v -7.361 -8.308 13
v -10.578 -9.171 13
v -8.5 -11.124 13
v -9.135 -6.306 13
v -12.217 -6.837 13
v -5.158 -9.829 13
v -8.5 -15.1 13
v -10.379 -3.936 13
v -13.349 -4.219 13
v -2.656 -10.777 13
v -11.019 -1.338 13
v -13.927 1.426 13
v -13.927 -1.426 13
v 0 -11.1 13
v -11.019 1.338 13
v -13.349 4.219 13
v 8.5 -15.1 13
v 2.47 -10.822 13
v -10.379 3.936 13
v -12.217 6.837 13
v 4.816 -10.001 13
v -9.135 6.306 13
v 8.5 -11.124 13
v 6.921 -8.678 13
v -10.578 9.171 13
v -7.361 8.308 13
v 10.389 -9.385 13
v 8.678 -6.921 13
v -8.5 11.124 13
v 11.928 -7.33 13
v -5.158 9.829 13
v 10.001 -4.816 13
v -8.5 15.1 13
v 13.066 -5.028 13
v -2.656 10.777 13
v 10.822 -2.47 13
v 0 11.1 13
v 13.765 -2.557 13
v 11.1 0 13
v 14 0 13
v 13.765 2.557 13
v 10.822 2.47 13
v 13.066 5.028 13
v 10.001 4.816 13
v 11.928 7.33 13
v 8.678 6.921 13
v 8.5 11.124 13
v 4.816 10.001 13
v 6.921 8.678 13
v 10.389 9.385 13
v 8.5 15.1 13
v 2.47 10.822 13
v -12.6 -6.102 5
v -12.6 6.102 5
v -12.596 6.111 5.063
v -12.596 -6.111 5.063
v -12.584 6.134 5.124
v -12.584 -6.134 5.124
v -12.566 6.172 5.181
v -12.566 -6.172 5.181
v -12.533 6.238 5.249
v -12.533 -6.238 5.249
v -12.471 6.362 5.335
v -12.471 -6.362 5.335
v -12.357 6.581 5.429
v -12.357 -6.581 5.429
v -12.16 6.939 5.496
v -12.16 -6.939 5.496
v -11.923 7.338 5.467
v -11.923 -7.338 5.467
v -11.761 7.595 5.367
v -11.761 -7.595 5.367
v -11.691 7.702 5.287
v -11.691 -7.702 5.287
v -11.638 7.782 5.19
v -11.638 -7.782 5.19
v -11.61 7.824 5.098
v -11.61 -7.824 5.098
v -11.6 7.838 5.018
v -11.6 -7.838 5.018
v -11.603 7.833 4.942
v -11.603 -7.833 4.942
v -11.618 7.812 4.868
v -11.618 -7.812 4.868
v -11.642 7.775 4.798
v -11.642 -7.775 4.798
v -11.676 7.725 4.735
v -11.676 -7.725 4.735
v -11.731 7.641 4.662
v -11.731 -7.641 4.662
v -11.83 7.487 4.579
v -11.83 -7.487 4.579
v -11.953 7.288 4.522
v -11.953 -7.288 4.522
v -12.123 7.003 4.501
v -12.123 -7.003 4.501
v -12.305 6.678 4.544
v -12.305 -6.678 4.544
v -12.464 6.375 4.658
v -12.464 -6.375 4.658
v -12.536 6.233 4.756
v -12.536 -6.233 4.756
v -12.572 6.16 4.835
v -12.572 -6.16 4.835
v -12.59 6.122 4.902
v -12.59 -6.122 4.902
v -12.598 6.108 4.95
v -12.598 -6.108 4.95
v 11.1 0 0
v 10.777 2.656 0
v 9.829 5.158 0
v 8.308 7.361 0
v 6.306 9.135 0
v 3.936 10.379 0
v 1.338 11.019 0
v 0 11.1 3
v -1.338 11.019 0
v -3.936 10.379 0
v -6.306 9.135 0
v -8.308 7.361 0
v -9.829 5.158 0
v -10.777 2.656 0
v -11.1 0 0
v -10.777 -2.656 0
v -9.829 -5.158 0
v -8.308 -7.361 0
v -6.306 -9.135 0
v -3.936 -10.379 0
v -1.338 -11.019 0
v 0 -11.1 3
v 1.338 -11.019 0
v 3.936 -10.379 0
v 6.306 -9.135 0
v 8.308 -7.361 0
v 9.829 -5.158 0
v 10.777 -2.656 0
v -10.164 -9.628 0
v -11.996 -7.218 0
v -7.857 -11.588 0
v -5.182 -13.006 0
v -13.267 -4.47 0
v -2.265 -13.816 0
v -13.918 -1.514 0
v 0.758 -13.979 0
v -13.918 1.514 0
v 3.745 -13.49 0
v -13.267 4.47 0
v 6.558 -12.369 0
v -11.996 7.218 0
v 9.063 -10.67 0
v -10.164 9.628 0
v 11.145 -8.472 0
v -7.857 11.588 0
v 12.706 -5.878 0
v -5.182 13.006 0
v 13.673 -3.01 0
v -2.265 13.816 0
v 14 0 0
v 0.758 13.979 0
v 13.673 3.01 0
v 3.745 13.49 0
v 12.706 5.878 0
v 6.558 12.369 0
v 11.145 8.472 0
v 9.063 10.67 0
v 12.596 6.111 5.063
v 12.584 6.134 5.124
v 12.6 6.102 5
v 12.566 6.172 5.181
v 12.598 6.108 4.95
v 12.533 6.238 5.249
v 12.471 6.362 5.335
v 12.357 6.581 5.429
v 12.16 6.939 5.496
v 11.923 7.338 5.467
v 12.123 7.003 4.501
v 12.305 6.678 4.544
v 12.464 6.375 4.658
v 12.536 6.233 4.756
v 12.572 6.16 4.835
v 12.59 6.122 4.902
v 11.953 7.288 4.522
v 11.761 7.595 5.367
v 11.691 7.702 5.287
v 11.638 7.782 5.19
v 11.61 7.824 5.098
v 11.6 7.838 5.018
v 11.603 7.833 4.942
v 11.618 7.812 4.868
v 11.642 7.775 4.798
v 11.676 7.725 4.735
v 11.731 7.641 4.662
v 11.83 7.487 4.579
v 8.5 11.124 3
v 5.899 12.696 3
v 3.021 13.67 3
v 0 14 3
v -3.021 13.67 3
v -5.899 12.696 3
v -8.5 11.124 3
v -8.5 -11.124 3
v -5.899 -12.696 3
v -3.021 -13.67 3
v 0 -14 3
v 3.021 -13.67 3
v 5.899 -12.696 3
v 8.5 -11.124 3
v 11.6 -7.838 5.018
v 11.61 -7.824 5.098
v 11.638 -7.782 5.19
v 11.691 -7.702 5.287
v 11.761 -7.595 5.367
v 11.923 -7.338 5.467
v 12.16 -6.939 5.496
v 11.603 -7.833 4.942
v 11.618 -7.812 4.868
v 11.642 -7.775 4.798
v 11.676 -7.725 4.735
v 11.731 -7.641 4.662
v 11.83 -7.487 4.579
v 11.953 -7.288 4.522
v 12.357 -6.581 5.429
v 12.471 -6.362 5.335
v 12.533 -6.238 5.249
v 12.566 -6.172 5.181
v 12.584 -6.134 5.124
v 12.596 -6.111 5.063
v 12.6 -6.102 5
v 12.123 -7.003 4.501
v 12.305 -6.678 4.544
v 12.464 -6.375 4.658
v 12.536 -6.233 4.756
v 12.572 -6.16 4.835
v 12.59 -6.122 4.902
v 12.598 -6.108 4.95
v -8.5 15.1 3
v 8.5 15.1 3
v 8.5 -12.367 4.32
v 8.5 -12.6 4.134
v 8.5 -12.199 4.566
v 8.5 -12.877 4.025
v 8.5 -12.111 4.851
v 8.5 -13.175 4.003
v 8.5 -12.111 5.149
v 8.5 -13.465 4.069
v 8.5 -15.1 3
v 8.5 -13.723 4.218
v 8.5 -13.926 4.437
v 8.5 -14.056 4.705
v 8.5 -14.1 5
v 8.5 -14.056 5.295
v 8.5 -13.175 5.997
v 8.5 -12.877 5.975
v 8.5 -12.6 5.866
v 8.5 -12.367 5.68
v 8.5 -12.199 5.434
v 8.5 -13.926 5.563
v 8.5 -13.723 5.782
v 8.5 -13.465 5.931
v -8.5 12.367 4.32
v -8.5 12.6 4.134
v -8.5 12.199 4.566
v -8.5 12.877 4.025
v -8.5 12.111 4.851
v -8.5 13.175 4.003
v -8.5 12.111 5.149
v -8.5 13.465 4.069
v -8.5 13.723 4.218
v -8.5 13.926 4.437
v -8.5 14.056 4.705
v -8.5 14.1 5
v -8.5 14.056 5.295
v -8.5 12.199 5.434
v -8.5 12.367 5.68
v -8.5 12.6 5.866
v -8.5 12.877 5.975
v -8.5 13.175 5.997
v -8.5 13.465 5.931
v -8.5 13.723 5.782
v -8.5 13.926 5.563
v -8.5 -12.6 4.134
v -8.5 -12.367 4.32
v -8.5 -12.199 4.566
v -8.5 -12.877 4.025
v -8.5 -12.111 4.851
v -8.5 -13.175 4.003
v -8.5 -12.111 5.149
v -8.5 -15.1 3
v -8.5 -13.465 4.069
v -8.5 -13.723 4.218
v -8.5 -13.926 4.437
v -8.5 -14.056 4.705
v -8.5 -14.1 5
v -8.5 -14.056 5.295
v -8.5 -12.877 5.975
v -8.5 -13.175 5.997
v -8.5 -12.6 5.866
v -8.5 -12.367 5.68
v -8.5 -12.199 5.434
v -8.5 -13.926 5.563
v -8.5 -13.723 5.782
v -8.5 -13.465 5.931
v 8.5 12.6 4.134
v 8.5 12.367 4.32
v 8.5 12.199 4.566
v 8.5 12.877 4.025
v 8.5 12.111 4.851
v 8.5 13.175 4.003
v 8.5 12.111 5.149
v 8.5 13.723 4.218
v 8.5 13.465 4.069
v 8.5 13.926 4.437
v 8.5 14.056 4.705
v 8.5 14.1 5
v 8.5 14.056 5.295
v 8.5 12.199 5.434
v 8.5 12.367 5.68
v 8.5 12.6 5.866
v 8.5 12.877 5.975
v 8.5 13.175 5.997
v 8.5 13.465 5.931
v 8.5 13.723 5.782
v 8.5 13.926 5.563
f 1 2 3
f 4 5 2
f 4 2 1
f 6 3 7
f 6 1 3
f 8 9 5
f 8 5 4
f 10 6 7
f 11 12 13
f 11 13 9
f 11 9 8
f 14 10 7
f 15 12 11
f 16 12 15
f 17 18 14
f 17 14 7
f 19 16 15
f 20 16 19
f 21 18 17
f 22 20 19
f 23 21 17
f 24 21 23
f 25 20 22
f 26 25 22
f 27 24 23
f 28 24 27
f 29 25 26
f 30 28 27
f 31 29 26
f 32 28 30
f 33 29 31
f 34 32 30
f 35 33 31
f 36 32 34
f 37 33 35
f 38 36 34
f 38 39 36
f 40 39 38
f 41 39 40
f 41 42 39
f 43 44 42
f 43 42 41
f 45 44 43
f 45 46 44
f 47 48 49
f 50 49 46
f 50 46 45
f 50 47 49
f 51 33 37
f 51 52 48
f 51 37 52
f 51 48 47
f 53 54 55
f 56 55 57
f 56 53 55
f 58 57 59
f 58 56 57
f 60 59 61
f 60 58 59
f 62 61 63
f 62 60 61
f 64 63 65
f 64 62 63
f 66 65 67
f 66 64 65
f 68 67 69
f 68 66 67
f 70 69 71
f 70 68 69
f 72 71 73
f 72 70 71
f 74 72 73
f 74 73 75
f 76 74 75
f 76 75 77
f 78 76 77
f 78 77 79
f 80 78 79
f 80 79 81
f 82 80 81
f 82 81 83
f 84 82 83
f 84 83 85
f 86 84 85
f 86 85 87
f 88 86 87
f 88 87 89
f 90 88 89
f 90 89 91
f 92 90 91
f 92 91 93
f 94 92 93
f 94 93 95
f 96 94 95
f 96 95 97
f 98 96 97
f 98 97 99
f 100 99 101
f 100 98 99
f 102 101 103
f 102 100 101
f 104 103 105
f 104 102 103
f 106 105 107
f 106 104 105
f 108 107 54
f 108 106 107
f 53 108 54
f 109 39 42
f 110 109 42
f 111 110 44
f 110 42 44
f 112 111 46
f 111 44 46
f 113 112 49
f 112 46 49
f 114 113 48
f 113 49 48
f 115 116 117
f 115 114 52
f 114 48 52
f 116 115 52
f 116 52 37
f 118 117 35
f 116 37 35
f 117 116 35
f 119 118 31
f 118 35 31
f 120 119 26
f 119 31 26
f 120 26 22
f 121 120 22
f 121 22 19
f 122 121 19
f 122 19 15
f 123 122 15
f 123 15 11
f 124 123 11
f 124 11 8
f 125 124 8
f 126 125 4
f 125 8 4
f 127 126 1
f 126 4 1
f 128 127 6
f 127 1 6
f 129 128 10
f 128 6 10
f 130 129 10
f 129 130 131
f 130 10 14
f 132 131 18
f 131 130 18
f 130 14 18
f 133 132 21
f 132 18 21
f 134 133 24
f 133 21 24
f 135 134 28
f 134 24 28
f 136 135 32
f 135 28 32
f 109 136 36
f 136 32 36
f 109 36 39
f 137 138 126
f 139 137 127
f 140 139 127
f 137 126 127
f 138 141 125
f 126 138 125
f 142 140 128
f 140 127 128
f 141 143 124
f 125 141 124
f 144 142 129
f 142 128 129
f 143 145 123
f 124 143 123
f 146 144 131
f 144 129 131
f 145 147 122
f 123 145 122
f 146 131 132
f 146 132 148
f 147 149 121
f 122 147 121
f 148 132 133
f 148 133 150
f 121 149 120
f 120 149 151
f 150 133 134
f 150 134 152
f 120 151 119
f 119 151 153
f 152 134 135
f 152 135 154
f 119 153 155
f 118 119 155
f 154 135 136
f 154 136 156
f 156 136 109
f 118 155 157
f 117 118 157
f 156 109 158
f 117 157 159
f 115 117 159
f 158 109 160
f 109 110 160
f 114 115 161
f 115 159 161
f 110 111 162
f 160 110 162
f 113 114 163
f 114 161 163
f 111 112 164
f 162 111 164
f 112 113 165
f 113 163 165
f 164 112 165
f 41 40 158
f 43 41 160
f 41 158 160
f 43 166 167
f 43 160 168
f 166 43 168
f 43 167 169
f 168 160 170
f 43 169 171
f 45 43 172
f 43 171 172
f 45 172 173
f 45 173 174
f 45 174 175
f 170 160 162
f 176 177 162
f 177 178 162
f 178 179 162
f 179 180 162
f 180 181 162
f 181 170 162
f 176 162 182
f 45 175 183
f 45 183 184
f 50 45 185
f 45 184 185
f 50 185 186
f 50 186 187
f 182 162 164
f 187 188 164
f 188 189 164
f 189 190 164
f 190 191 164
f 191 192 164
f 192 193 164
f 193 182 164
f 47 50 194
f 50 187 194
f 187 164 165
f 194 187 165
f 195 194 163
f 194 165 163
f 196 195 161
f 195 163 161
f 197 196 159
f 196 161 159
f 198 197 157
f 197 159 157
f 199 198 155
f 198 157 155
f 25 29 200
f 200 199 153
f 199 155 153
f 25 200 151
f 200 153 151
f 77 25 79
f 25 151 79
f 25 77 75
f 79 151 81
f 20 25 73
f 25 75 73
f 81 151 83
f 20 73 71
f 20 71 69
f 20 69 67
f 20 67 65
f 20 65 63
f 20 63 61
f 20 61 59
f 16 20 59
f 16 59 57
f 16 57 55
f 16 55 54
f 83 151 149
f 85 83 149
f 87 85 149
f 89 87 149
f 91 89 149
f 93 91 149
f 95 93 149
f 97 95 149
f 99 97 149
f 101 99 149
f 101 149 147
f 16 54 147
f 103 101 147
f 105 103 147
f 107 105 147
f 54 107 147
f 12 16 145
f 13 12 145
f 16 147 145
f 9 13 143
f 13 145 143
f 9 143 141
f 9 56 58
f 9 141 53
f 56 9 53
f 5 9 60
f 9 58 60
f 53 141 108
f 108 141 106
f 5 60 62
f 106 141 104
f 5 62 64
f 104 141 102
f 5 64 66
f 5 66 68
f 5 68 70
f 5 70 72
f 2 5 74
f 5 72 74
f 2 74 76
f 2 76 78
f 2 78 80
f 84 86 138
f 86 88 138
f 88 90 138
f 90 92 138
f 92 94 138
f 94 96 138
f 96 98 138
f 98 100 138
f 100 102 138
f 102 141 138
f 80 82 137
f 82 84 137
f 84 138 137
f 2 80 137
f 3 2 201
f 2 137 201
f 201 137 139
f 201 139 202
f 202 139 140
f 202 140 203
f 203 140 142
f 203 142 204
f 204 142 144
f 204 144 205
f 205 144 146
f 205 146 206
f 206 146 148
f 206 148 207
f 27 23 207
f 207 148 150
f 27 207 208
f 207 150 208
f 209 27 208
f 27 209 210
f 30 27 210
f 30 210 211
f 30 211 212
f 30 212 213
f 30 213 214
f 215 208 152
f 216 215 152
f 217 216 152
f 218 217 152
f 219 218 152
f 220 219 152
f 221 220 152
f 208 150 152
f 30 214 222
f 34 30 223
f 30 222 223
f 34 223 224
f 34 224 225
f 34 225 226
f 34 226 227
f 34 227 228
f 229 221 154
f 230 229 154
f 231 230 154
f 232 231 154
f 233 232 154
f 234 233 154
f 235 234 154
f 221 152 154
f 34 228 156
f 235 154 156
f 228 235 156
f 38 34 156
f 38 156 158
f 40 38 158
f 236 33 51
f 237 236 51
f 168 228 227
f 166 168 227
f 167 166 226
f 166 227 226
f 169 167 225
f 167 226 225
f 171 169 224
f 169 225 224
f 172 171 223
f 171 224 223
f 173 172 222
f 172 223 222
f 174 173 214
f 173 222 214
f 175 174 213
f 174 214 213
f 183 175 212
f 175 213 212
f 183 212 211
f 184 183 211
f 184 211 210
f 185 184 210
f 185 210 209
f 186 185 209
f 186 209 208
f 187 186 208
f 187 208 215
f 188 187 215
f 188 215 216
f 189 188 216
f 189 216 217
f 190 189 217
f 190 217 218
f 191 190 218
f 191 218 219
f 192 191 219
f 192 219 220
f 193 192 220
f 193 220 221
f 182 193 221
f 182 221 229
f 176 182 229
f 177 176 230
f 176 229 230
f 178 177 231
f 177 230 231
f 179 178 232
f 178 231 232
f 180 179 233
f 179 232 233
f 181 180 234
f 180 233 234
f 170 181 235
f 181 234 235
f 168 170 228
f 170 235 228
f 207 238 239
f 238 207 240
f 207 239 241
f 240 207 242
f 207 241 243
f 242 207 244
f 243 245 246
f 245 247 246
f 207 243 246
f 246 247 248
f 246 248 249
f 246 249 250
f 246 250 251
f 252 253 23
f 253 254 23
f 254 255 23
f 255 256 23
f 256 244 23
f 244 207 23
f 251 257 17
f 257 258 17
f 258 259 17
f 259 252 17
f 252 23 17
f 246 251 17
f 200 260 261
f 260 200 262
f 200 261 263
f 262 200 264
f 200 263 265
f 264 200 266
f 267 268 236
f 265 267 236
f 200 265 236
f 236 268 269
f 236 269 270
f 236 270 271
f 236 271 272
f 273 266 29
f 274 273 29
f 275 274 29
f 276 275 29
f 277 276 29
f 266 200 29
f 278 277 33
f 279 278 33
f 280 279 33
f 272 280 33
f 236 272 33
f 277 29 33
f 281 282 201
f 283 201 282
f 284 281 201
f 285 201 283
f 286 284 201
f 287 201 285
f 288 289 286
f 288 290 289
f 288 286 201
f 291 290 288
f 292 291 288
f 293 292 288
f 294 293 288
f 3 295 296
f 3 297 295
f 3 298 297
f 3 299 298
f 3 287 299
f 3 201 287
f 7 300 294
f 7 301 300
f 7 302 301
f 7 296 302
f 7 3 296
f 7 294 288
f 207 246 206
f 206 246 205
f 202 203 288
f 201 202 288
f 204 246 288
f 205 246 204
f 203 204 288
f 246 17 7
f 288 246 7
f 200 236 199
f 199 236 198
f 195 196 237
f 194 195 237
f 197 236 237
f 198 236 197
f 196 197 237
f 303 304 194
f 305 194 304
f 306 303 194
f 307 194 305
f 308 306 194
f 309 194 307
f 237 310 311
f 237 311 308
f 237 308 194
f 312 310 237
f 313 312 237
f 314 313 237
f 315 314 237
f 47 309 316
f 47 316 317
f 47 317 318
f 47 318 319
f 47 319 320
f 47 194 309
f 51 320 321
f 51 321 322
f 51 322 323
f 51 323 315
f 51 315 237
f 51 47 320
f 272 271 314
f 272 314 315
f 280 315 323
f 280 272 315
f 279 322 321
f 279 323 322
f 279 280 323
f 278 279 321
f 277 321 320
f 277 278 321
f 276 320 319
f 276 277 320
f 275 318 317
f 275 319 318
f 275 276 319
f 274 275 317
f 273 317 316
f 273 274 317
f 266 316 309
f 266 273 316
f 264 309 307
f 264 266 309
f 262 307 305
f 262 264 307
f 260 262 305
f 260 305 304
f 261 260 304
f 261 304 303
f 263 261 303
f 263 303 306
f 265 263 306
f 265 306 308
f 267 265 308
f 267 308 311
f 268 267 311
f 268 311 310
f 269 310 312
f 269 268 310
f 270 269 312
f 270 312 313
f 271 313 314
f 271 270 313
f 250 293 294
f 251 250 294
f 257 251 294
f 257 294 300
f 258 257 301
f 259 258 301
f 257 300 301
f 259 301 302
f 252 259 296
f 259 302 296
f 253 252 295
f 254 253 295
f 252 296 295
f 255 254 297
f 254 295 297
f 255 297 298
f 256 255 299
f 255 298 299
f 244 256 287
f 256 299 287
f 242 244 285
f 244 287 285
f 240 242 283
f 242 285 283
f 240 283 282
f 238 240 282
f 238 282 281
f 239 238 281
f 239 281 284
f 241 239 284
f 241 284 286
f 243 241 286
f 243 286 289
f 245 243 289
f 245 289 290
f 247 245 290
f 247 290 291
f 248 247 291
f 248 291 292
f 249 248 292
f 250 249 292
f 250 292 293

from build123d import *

# Parameters (mm, degrees)
SKETCH_R           = 14
PAD_DEPTH          = 13
SKETCH001_R        = 11.1
POCKET_DEPTH       = 13.001
SKETCH002_W        = 17
SKETCH002_H        = 4
PAD001_DEPTH       = 10
POLARPATTERN_COUNT = 2
SKETCH003_R        = 0.5
POCKET001_DEPTH    = 111.473218
SKETCH004_R        = 1
POCKET002_DEPTH    = 110.373218


with BuildPart() as part:
    # Sketch → Pad (new body)
    with BuildSketch(Plane.XY):
        Circle(SKETCH_R)
    extrude(amount=PAD_DEPTH)

    # Sketch001 → Pocket (cut, through all)
    with BuildSketch(Plane.XY.offset(13)):
        Circle(SKETCH001_R)
    extrude(amount=-POCKET_DEPTH, mode=Mode.SUBTRACT)

    # Sketch002 → Pad001 (new body)
    with BuildSketch(Plane.XY.offset(13)):
        with Locations((0, 13.1)):
            Rectangle(SKETCH002_W, SKETCH002_H)
    pad001 = extrude(amount=-PAD001_DEPTH)

    # PolarPattern: Pad001 ×2 about axis
    polarpattern_axis = Axis((0, 0, 13), (0, 0, 1))
    for i in range(1, POLARPATTERN_COUNT):
        add(pad001.rotate(polarpattern_axis, i * 360 / POLARPATTERN_COUNT))

    # Sketch003 → Pocket001 (cut, through all)
    with BuildSketch(Plane.XZ.offset(10)):
        with Locations((12.1, 5)):
            Circle(SKETCH003_R)
    pocket001 = extrude(amount=-POCKET001_DEPTH, mode=Mode.SUBTRACT)

    # Mirrored: Pocket001 across Sketch003 V_Axis
    add(pocket001.mirror(Plane(origin=(0, -10, 0), x_dir=(0, -1, 0), z_dir=(1, 0, 0))), mode=Mode.SUBTRACT)

    # Sketch004 → Pocket002 (cut, through all)
    with BuildSketch(Plane(origin=(-10, 0, 0), x_dir=(0, -1, 0), z_dir=(-1, 0, 0))):
        with Locations((13.1, 5)):
            Circle(SKETCH004_R)
    pocket002 = extrude(amount=-POCKET002_DEPTH, mode=Mode.SUBTRACT)

    # Mirrored001: Pocket002 across Sketch004 V_Axis
    add(pocket002.mirror(Plane(origin=(-10, 0, 0), x_dir=(-1, 0, 0), z_dir=(0, -1, 0))), mode=Mode.SUBTRACT)


solid = part.part
